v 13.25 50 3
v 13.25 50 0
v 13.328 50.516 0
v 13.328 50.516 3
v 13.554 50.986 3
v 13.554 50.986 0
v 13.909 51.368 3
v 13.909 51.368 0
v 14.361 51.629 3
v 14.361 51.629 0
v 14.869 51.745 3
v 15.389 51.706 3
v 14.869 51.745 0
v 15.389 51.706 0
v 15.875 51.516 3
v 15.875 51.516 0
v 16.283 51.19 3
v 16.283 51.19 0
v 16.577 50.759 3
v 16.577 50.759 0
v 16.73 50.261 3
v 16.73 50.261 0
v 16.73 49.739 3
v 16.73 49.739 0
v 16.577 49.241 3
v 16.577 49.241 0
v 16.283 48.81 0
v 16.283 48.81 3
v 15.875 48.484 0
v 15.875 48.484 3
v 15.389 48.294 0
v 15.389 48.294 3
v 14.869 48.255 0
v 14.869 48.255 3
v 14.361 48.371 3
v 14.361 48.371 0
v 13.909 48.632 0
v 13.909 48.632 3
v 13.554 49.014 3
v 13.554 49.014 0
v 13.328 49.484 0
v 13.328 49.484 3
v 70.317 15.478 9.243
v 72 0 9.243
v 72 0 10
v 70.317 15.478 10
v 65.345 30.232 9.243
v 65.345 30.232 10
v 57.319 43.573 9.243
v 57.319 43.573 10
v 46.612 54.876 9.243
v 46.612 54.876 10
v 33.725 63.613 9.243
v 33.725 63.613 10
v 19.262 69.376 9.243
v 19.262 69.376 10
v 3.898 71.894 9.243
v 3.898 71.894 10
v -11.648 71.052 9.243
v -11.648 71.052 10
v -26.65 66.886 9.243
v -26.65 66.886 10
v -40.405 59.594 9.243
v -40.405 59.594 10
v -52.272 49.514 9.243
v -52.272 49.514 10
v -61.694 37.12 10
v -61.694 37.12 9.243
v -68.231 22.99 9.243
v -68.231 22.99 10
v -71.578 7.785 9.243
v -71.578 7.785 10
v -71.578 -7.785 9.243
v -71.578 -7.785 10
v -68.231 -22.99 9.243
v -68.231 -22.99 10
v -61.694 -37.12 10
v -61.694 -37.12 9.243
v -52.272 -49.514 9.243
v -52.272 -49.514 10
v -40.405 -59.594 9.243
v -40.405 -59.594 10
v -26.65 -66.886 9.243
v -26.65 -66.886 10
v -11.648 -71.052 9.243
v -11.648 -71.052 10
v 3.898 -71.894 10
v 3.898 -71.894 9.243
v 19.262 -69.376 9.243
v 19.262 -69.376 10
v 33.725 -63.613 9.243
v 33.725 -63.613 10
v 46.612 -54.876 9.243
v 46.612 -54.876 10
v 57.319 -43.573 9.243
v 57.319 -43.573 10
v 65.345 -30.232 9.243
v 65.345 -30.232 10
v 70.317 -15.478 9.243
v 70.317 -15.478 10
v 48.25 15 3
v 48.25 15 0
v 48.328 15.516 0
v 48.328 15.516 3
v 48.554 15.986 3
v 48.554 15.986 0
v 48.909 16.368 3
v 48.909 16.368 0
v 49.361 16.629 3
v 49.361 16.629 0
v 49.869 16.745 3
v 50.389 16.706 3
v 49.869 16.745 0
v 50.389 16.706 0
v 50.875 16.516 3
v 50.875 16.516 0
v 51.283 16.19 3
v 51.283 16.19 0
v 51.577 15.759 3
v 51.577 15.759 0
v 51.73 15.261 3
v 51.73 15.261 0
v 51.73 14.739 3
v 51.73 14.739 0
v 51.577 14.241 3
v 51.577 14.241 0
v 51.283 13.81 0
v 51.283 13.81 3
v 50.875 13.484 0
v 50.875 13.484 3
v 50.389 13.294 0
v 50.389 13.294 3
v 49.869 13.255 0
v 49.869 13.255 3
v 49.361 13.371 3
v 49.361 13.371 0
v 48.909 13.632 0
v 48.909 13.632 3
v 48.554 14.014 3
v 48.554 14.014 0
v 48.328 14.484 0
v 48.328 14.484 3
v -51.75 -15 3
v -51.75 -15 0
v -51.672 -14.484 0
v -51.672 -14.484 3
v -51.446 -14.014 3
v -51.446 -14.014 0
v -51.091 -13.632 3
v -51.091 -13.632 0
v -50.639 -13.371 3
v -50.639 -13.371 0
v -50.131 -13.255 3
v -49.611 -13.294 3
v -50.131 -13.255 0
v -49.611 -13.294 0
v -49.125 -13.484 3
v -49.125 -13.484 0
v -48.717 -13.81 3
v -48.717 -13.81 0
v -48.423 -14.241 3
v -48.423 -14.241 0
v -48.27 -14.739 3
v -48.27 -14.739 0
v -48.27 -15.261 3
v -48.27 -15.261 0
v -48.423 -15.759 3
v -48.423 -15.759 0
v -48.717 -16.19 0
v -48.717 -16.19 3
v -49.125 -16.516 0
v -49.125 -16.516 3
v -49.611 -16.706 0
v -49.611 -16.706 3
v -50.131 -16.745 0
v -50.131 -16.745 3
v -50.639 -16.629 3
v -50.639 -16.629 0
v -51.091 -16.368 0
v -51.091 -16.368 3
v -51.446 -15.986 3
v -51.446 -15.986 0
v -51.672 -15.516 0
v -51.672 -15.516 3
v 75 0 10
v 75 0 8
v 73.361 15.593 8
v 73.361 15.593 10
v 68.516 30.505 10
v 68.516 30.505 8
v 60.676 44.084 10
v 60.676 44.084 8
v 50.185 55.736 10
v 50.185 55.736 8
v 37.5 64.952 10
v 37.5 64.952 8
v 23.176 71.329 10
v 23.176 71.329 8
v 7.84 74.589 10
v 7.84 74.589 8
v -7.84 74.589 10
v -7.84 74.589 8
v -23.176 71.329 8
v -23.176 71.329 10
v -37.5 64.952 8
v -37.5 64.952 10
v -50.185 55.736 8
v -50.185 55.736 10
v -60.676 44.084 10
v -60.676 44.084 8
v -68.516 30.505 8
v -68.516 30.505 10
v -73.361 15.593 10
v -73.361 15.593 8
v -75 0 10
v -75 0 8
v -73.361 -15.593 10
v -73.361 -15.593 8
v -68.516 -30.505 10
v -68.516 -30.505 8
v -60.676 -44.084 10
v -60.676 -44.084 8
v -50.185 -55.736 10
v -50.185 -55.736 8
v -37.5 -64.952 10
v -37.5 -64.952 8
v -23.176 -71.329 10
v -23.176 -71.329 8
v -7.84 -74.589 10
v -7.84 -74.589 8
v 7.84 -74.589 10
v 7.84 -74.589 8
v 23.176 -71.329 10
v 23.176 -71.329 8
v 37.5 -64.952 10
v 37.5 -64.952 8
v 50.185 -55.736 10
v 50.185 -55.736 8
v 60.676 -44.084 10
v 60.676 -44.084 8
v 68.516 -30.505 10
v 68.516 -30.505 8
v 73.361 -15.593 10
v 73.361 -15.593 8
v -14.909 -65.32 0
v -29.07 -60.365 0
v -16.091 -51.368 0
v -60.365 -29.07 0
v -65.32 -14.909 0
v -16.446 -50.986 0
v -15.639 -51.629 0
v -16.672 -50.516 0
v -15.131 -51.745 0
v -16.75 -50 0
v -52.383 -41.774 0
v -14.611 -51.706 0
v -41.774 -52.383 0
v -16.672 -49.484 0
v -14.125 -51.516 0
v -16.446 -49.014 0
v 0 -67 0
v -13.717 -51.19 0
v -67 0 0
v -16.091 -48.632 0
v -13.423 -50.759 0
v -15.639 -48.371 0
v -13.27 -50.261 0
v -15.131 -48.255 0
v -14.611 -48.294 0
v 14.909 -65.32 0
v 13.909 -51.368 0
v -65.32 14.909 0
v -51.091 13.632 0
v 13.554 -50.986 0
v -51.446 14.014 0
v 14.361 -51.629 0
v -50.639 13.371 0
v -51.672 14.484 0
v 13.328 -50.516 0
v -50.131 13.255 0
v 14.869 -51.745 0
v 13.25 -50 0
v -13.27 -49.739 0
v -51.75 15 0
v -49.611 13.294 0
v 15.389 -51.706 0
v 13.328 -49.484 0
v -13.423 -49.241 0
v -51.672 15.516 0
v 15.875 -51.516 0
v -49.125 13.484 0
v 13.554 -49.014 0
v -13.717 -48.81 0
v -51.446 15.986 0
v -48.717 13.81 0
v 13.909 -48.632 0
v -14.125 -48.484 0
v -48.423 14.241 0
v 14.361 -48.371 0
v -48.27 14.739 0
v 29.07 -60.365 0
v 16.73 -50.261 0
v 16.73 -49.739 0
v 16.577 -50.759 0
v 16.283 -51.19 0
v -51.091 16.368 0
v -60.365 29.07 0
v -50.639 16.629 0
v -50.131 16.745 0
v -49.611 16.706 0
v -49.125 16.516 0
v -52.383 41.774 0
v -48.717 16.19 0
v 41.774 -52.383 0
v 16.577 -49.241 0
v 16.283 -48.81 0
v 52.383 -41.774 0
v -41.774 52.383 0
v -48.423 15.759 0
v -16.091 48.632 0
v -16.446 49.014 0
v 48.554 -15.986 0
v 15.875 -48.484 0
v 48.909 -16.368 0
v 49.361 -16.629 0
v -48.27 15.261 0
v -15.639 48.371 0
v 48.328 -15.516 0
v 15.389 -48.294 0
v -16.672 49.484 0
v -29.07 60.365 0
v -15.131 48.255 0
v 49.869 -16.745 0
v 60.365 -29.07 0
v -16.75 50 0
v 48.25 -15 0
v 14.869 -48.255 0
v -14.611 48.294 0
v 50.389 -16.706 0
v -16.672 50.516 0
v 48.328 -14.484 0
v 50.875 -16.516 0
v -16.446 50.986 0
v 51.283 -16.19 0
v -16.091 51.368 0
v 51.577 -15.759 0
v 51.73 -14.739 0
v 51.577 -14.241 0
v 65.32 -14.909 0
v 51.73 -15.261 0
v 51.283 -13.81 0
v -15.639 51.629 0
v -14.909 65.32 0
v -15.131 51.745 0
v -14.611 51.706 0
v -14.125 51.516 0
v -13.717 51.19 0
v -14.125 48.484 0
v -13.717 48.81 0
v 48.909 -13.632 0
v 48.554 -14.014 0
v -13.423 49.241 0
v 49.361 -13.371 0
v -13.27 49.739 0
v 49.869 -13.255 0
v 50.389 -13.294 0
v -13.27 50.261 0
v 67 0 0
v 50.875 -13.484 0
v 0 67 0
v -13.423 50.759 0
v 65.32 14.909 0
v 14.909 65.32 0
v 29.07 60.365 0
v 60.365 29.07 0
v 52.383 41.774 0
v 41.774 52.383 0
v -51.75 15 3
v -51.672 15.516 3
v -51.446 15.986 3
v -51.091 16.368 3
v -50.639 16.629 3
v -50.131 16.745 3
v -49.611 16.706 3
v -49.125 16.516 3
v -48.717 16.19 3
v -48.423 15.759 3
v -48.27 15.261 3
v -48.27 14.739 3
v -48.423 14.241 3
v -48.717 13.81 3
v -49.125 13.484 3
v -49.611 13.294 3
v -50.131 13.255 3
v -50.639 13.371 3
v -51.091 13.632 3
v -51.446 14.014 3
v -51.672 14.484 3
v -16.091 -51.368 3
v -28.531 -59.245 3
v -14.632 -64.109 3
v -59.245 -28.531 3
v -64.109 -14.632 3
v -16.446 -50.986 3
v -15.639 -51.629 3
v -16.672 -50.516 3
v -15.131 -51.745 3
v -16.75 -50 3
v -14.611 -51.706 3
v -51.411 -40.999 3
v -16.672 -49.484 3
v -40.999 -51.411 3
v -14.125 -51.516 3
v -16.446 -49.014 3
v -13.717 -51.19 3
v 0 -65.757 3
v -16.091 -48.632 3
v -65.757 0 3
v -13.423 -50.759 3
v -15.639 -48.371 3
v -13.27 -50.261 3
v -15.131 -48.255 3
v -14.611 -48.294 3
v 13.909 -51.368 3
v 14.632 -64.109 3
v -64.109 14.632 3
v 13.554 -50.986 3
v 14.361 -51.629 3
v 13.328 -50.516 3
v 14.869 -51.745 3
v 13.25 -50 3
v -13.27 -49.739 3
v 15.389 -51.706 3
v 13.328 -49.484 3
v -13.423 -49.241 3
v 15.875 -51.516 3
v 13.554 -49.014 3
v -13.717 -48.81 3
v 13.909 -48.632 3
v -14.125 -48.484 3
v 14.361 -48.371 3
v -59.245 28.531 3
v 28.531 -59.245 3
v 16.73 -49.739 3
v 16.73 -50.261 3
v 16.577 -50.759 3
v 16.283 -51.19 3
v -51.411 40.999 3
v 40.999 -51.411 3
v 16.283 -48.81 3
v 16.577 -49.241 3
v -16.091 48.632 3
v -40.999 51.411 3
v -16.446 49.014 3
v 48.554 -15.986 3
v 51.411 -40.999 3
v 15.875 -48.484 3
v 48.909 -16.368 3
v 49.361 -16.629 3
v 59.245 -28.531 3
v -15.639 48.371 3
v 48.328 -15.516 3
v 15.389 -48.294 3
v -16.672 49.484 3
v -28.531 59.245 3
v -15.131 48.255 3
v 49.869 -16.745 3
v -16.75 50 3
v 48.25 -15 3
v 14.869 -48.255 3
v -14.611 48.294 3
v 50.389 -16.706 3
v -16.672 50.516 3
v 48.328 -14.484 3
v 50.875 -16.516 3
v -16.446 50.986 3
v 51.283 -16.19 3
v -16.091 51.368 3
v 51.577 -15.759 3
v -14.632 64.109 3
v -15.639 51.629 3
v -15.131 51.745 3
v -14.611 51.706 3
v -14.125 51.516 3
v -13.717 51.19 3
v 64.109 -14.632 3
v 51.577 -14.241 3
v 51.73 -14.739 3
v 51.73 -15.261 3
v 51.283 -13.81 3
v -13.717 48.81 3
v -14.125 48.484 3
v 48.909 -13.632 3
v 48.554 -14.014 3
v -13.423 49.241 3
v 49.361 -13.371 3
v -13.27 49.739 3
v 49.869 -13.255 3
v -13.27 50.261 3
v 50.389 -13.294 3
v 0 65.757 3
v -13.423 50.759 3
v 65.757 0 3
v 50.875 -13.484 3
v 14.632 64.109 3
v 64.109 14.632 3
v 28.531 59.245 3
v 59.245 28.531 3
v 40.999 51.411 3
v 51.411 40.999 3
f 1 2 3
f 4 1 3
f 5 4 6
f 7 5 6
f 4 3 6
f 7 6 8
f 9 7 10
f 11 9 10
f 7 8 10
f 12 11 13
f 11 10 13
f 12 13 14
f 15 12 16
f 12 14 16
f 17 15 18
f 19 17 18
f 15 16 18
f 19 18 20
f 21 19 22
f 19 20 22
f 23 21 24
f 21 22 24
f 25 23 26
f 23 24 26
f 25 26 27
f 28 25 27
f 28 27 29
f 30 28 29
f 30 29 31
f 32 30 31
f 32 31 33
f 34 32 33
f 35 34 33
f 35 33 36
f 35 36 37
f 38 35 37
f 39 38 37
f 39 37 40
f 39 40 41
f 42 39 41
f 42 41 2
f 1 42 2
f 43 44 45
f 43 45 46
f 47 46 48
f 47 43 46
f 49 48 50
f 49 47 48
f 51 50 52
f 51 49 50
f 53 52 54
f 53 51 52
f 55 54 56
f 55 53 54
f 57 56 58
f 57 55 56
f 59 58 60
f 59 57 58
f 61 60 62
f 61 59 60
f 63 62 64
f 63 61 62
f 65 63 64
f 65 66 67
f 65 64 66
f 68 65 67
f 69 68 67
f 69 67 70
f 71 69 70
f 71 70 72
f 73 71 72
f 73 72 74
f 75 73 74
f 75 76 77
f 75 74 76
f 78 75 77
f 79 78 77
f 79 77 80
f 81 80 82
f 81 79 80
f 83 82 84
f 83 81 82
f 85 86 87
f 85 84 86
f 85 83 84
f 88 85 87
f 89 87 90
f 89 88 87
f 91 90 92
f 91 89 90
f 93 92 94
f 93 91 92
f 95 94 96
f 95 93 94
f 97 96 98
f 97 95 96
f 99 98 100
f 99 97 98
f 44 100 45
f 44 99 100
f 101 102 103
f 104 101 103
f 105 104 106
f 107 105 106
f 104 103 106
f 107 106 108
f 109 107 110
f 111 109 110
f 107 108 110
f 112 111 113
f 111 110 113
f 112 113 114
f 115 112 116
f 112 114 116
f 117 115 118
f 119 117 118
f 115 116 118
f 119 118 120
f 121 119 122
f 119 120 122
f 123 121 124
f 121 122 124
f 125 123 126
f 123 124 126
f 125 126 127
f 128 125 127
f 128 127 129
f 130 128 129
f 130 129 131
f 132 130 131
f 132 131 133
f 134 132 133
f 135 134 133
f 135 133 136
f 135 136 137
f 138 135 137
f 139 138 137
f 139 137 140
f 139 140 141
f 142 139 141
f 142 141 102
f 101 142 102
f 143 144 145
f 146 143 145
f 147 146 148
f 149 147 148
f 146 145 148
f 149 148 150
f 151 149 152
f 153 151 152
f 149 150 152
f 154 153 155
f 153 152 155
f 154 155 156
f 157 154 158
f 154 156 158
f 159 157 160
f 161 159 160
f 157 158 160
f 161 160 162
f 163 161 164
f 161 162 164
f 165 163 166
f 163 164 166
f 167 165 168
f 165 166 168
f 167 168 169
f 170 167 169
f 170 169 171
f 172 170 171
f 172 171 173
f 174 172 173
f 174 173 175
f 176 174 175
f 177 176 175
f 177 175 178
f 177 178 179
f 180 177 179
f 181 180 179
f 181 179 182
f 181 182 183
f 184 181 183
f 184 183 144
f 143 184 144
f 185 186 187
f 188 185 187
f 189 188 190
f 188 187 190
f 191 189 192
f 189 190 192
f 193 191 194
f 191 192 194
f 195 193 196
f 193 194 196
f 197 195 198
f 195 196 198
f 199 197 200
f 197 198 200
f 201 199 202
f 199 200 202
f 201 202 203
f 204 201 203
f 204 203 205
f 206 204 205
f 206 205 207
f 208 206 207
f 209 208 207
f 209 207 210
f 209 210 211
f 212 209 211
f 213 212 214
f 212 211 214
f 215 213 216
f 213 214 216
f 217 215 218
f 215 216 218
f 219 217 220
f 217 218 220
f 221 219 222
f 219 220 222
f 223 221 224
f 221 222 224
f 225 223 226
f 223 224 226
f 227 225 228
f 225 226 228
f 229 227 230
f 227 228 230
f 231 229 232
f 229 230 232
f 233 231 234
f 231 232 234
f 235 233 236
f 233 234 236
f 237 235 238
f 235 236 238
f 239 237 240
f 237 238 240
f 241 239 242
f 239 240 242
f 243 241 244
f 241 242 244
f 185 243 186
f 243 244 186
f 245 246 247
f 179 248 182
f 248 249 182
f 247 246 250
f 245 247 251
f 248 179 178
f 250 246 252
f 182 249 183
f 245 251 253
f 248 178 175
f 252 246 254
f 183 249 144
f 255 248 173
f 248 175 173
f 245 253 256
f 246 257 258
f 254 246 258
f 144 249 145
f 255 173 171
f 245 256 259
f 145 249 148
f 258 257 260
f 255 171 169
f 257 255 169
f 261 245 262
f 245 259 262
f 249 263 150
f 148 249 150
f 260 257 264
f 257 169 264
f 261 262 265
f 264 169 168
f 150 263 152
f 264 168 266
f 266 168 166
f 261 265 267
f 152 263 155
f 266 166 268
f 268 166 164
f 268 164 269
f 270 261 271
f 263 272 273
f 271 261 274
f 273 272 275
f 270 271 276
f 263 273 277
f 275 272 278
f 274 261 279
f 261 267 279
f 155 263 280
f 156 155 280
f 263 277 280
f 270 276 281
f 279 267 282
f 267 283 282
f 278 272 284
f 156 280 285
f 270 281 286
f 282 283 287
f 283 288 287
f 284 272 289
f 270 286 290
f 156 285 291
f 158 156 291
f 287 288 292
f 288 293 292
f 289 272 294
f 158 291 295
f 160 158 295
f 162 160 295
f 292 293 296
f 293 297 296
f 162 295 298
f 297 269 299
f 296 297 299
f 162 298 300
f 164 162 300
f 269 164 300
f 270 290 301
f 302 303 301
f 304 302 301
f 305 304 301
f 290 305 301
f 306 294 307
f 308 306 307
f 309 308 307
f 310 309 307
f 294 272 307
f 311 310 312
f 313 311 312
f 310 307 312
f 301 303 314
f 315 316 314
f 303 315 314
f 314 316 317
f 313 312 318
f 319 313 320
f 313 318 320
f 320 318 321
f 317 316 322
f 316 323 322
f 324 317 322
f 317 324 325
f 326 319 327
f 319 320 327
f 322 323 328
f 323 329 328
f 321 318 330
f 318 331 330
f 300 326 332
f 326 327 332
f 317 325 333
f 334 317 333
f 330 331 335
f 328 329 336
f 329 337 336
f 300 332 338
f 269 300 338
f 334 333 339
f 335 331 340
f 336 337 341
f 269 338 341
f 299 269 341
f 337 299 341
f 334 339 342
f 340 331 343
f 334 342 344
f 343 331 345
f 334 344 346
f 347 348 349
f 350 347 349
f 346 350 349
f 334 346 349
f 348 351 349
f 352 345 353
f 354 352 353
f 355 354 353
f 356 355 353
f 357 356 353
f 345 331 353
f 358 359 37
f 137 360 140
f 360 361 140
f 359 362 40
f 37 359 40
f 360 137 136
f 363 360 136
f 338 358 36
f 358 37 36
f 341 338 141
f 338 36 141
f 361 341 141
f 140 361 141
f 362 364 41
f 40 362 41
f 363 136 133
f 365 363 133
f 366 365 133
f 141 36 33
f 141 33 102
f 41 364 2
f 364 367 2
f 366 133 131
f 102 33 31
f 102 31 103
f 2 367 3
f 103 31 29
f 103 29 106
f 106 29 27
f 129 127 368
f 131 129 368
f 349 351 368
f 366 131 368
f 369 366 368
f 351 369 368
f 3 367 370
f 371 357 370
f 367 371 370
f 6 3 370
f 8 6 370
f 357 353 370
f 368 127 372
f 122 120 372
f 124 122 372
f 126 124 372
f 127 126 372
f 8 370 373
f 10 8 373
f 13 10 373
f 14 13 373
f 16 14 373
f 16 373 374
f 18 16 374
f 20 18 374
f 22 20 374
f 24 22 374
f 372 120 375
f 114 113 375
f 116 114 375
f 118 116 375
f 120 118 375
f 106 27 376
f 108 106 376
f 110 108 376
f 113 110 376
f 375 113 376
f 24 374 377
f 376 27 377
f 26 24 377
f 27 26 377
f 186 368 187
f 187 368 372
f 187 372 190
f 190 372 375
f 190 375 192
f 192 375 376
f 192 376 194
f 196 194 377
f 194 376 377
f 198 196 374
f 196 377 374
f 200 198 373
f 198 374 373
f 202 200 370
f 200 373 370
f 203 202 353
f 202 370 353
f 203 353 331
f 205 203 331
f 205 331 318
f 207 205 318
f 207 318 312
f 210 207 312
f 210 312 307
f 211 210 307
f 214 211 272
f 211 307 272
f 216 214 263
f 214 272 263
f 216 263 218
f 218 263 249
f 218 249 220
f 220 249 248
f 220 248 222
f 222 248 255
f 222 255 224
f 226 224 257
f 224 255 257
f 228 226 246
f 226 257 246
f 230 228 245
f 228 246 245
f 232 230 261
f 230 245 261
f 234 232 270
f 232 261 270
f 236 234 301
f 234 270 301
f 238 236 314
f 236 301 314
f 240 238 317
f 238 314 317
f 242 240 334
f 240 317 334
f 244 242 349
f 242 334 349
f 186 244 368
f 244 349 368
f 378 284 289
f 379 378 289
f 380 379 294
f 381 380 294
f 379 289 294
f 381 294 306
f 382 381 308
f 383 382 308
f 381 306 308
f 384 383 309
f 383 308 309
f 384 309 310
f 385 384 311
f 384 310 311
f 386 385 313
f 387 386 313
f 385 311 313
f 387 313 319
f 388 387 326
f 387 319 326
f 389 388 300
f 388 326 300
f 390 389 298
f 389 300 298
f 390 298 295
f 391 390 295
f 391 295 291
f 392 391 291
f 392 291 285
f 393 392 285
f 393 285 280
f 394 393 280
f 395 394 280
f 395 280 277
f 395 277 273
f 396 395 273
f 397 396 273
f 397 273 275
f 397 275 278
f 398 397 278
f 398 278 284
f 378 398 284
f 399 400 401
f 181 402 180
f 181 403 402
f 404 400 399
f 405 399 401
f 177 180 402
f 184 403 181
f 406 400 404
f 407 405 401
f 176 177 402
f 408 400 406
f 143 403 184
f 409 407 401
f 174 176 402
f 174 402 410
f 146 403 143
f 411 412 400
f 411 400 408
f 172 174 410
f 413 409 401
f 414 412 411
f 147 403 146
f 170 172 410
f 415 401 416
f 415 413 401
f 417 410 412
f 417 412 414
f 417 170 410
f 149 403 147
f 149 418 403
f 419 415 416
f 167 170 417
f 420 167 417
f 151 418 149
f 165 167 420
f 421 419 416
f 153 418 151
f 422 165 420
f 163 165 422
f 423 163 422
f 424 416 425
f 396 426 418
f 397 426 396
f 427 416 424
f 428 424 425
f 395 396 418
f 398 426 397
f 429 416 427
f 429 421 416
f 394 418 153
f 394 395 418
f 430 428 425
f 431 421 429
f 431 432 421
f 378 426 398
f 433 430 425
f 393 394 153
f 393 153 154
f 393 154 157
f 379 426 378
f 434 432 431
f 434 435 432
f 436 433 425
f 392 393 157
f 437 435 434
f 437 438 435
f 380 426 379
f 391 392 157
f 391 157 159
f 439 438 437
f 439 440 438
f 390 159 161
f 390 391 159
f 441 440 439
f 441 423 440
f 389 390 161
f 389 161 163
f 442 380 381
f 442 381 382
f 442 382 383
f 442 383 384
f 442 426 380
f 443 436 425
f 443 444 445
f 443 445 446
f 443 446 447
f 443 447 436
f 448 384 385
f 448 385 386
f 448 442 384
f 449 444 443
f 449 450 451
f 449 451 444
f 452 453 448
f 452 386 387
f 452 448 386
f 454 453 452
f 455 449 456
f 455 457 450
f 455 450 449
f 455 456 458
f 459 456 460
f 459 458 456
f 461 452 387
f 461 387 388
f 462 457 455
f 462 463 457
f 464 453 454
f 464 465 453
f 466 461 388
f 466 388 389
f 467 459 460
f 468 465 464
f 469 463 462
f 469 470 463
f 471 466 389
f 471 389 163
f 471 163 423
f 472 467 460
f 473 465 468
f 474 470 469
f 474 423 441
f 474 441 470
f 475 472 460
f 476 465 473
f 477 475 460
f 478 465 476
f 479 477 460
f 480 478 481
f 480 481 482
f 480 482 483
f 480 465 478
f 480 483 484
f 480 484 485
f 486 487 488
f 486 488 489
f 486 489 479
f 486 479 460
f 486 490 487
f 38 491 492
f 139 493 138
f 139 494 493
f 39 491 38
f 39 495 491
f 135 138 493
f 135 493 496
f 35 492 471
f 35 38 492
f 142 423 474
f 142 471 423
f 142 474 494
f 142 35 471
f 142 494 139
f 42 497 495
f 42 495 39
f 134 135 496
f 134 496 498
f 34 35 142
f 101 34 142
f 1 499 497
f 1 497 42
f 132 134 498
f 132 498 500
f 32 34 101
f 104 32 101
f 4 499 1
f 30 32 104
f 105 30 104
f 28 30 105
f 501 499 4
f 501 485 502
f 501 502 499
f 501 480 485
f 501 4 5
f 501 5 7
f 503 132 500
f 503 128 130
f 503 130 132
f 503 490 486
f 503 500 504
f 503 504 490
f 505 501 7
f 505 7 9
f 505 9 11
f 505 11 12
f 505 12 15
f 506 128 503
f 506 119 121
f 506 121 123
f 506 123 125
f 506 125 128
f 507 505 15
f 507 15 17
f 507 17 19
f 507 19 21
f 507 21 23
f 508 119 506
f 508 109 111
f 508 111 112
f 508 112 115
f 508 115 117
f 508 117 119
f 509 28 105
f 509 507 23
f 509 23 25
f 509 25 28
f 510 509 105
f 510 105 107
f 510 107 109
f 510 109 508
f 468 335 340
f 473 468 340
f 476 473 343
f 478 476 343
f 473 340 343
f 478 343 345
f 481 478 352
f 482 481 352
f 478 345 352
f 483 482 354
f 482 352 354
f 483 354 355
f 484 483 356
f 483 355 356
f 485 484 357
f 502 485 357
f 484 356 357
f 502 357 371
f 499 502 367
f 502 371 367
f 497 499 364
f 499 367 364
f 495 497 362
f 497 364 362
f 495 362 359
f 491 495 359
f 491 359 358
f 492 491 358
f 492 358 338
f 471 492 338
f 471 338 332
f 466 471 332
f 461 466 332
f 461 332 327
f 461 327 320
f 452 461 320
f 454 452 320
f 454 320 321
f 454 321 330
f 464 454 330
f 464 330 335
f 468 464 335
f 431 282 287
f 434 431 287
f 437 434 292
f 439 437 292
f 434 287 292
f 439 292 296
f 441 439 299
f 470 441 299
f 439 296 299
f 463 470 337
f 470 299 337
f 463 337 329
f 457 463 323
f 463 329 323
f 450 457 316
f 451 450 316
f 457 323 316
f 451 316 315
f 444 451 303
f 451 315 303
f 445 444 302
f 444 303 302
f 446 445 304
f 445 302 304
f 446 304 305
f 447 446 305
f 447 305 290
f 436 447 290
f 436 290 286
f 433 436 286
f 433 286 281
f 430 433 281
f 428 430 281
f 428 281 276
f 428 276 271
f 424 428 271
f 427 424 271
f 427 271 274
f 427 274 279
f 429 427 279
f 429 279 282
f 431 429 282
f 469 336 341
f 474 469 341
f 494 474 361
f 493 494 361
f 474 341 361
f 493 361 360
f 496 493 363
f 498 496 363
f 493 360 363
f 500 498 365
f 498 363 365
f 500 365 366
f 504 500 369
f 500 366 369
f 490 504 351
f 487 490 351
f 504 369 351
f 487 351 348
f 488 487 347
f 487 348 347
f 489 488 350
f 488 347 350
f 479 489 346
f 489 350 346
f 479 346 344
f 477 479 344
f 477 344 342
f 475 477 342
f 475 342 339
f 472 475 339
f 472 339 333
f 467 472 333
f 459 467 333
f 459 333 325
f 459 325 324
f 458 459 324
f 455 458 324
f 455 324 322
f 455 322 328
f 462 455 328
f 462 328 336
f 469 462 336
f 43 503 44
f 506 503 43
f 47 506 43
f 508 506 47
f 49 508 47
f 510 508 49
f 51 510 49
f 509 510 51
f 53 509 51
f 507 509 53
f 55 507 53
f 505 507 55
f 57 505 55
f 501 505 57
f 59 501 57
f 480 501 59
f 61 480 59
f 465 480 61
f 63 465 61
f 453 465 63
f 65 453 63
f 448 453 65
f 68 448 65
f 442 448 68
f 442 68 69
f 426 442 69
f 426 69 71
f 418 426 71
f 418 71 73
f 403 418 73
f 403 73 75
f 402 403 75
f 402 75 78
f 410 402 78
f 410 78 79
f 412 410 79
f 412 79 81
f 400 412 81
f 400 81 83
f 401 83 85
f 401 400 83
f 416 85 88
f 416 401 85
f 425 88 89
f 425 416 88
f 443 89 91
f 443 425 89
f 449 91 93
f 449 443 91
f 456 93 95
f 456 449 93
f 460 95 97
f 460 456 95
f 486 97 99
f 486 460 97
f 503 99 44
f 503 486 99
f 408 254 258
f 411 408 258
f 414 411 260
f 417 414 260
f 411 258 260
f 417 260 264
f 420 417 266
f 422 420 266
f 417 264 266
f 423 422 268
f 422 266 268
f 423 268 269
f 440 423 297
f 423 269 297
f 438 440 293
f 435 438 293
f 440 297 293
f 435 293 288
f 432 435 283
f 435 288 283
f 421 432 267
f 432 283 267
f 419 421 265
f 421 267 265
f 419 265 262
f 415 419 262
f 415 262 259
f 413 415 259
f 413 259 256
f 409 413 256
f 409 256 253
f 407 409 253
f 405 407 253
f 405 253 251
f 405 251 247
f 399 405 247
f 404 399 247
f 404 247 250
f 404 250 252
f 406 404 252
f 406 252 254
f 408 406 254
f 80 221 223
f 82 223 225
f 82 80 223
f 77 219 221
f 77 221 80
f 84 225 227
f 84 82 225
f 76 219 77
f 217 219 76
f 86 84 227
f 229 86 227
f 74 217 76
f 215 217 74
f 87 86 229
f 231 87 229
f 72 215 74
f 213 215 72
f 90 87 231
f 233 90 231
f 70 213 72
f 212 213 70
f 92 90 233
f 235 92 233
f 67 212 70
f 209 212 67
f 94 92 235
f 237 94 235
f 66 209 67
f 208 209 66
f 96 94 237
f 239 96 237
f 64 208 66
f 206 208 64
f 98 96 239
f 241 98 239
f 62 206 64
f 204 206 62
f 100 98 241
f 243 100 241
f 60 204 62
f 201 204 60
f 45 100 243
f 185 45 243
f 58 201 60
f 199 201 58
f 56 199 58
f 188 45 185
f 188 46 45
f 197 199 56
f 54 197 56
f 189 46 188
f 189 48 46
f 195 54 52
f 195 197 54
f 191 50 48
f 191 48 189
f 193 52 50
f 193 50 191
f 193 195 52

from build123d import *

# Parameters (mm, degrees)
SKETCH1_R           = 75
BOSS_EXTRUDE1_DEPTH = 10
CHAMFER1_SIZE       = 8
SHELL1_T            = -3
SKETCH2_R           = 1.75
CUT_EXTRUDE1_DEPTH  = 107.536378763


with BuildPart() as part:
    # Sketch1 → Boss-Extrude1 (new body)
    with BuildSketch(Plane.XY):
        Circle(SKETCH1_R)
    extrude(amount=BOSS_EXTRUDE1_DEPTH)

    # Chamfer1
    chamfer1_edges = [part.edges().sort_by_distance(p)[0] for p in [
        (-75, 0, 0),
    ]]
    chamfer(chamfer1_edges, length=CHAMFER1_SIZE)

    # Shell1
    shell1_openings = [part.faces().sort_by_distance(p)[0] for p in [
        (0, 0, 10),
    ]]
    offset(amount=SHELL1_T, openings=shell1_openings, kind=Kind.INTERSECTION)

    # Sketch2 → Cut-Extrude1 (cut, through all)
    with BuildSketch(Plane(origin=(0, 0, 0), x_dir=(-1, 0, 0), z_dir=(0, 0, -1))):
        with Locations((-50, 15)):
            Circle(SKETCH2_R)
        with Locations((-50, -15)):
            Circle(SKETCH2_R)
        with Locations((-15, -50)):
            Circle(SKETCH2_R)
        with Locations((15, -50)):
            Circle(SKETCH2_R)
        with Locations((50, -15)):
            Circle(SKETCH2_R)
        with Locations((50, 15)):
            Circle(SKETCH2_R)
        with Locations((-15, 50)):
            Circle(SKETCH2_R)
        with Locations((15, 50)):
            Circle(SKETCH2_R)
    extrude(amount=-CUT_EXTRUDE1_DEPTH, mode=Mode.SUBTRACT)


solid = part.part
